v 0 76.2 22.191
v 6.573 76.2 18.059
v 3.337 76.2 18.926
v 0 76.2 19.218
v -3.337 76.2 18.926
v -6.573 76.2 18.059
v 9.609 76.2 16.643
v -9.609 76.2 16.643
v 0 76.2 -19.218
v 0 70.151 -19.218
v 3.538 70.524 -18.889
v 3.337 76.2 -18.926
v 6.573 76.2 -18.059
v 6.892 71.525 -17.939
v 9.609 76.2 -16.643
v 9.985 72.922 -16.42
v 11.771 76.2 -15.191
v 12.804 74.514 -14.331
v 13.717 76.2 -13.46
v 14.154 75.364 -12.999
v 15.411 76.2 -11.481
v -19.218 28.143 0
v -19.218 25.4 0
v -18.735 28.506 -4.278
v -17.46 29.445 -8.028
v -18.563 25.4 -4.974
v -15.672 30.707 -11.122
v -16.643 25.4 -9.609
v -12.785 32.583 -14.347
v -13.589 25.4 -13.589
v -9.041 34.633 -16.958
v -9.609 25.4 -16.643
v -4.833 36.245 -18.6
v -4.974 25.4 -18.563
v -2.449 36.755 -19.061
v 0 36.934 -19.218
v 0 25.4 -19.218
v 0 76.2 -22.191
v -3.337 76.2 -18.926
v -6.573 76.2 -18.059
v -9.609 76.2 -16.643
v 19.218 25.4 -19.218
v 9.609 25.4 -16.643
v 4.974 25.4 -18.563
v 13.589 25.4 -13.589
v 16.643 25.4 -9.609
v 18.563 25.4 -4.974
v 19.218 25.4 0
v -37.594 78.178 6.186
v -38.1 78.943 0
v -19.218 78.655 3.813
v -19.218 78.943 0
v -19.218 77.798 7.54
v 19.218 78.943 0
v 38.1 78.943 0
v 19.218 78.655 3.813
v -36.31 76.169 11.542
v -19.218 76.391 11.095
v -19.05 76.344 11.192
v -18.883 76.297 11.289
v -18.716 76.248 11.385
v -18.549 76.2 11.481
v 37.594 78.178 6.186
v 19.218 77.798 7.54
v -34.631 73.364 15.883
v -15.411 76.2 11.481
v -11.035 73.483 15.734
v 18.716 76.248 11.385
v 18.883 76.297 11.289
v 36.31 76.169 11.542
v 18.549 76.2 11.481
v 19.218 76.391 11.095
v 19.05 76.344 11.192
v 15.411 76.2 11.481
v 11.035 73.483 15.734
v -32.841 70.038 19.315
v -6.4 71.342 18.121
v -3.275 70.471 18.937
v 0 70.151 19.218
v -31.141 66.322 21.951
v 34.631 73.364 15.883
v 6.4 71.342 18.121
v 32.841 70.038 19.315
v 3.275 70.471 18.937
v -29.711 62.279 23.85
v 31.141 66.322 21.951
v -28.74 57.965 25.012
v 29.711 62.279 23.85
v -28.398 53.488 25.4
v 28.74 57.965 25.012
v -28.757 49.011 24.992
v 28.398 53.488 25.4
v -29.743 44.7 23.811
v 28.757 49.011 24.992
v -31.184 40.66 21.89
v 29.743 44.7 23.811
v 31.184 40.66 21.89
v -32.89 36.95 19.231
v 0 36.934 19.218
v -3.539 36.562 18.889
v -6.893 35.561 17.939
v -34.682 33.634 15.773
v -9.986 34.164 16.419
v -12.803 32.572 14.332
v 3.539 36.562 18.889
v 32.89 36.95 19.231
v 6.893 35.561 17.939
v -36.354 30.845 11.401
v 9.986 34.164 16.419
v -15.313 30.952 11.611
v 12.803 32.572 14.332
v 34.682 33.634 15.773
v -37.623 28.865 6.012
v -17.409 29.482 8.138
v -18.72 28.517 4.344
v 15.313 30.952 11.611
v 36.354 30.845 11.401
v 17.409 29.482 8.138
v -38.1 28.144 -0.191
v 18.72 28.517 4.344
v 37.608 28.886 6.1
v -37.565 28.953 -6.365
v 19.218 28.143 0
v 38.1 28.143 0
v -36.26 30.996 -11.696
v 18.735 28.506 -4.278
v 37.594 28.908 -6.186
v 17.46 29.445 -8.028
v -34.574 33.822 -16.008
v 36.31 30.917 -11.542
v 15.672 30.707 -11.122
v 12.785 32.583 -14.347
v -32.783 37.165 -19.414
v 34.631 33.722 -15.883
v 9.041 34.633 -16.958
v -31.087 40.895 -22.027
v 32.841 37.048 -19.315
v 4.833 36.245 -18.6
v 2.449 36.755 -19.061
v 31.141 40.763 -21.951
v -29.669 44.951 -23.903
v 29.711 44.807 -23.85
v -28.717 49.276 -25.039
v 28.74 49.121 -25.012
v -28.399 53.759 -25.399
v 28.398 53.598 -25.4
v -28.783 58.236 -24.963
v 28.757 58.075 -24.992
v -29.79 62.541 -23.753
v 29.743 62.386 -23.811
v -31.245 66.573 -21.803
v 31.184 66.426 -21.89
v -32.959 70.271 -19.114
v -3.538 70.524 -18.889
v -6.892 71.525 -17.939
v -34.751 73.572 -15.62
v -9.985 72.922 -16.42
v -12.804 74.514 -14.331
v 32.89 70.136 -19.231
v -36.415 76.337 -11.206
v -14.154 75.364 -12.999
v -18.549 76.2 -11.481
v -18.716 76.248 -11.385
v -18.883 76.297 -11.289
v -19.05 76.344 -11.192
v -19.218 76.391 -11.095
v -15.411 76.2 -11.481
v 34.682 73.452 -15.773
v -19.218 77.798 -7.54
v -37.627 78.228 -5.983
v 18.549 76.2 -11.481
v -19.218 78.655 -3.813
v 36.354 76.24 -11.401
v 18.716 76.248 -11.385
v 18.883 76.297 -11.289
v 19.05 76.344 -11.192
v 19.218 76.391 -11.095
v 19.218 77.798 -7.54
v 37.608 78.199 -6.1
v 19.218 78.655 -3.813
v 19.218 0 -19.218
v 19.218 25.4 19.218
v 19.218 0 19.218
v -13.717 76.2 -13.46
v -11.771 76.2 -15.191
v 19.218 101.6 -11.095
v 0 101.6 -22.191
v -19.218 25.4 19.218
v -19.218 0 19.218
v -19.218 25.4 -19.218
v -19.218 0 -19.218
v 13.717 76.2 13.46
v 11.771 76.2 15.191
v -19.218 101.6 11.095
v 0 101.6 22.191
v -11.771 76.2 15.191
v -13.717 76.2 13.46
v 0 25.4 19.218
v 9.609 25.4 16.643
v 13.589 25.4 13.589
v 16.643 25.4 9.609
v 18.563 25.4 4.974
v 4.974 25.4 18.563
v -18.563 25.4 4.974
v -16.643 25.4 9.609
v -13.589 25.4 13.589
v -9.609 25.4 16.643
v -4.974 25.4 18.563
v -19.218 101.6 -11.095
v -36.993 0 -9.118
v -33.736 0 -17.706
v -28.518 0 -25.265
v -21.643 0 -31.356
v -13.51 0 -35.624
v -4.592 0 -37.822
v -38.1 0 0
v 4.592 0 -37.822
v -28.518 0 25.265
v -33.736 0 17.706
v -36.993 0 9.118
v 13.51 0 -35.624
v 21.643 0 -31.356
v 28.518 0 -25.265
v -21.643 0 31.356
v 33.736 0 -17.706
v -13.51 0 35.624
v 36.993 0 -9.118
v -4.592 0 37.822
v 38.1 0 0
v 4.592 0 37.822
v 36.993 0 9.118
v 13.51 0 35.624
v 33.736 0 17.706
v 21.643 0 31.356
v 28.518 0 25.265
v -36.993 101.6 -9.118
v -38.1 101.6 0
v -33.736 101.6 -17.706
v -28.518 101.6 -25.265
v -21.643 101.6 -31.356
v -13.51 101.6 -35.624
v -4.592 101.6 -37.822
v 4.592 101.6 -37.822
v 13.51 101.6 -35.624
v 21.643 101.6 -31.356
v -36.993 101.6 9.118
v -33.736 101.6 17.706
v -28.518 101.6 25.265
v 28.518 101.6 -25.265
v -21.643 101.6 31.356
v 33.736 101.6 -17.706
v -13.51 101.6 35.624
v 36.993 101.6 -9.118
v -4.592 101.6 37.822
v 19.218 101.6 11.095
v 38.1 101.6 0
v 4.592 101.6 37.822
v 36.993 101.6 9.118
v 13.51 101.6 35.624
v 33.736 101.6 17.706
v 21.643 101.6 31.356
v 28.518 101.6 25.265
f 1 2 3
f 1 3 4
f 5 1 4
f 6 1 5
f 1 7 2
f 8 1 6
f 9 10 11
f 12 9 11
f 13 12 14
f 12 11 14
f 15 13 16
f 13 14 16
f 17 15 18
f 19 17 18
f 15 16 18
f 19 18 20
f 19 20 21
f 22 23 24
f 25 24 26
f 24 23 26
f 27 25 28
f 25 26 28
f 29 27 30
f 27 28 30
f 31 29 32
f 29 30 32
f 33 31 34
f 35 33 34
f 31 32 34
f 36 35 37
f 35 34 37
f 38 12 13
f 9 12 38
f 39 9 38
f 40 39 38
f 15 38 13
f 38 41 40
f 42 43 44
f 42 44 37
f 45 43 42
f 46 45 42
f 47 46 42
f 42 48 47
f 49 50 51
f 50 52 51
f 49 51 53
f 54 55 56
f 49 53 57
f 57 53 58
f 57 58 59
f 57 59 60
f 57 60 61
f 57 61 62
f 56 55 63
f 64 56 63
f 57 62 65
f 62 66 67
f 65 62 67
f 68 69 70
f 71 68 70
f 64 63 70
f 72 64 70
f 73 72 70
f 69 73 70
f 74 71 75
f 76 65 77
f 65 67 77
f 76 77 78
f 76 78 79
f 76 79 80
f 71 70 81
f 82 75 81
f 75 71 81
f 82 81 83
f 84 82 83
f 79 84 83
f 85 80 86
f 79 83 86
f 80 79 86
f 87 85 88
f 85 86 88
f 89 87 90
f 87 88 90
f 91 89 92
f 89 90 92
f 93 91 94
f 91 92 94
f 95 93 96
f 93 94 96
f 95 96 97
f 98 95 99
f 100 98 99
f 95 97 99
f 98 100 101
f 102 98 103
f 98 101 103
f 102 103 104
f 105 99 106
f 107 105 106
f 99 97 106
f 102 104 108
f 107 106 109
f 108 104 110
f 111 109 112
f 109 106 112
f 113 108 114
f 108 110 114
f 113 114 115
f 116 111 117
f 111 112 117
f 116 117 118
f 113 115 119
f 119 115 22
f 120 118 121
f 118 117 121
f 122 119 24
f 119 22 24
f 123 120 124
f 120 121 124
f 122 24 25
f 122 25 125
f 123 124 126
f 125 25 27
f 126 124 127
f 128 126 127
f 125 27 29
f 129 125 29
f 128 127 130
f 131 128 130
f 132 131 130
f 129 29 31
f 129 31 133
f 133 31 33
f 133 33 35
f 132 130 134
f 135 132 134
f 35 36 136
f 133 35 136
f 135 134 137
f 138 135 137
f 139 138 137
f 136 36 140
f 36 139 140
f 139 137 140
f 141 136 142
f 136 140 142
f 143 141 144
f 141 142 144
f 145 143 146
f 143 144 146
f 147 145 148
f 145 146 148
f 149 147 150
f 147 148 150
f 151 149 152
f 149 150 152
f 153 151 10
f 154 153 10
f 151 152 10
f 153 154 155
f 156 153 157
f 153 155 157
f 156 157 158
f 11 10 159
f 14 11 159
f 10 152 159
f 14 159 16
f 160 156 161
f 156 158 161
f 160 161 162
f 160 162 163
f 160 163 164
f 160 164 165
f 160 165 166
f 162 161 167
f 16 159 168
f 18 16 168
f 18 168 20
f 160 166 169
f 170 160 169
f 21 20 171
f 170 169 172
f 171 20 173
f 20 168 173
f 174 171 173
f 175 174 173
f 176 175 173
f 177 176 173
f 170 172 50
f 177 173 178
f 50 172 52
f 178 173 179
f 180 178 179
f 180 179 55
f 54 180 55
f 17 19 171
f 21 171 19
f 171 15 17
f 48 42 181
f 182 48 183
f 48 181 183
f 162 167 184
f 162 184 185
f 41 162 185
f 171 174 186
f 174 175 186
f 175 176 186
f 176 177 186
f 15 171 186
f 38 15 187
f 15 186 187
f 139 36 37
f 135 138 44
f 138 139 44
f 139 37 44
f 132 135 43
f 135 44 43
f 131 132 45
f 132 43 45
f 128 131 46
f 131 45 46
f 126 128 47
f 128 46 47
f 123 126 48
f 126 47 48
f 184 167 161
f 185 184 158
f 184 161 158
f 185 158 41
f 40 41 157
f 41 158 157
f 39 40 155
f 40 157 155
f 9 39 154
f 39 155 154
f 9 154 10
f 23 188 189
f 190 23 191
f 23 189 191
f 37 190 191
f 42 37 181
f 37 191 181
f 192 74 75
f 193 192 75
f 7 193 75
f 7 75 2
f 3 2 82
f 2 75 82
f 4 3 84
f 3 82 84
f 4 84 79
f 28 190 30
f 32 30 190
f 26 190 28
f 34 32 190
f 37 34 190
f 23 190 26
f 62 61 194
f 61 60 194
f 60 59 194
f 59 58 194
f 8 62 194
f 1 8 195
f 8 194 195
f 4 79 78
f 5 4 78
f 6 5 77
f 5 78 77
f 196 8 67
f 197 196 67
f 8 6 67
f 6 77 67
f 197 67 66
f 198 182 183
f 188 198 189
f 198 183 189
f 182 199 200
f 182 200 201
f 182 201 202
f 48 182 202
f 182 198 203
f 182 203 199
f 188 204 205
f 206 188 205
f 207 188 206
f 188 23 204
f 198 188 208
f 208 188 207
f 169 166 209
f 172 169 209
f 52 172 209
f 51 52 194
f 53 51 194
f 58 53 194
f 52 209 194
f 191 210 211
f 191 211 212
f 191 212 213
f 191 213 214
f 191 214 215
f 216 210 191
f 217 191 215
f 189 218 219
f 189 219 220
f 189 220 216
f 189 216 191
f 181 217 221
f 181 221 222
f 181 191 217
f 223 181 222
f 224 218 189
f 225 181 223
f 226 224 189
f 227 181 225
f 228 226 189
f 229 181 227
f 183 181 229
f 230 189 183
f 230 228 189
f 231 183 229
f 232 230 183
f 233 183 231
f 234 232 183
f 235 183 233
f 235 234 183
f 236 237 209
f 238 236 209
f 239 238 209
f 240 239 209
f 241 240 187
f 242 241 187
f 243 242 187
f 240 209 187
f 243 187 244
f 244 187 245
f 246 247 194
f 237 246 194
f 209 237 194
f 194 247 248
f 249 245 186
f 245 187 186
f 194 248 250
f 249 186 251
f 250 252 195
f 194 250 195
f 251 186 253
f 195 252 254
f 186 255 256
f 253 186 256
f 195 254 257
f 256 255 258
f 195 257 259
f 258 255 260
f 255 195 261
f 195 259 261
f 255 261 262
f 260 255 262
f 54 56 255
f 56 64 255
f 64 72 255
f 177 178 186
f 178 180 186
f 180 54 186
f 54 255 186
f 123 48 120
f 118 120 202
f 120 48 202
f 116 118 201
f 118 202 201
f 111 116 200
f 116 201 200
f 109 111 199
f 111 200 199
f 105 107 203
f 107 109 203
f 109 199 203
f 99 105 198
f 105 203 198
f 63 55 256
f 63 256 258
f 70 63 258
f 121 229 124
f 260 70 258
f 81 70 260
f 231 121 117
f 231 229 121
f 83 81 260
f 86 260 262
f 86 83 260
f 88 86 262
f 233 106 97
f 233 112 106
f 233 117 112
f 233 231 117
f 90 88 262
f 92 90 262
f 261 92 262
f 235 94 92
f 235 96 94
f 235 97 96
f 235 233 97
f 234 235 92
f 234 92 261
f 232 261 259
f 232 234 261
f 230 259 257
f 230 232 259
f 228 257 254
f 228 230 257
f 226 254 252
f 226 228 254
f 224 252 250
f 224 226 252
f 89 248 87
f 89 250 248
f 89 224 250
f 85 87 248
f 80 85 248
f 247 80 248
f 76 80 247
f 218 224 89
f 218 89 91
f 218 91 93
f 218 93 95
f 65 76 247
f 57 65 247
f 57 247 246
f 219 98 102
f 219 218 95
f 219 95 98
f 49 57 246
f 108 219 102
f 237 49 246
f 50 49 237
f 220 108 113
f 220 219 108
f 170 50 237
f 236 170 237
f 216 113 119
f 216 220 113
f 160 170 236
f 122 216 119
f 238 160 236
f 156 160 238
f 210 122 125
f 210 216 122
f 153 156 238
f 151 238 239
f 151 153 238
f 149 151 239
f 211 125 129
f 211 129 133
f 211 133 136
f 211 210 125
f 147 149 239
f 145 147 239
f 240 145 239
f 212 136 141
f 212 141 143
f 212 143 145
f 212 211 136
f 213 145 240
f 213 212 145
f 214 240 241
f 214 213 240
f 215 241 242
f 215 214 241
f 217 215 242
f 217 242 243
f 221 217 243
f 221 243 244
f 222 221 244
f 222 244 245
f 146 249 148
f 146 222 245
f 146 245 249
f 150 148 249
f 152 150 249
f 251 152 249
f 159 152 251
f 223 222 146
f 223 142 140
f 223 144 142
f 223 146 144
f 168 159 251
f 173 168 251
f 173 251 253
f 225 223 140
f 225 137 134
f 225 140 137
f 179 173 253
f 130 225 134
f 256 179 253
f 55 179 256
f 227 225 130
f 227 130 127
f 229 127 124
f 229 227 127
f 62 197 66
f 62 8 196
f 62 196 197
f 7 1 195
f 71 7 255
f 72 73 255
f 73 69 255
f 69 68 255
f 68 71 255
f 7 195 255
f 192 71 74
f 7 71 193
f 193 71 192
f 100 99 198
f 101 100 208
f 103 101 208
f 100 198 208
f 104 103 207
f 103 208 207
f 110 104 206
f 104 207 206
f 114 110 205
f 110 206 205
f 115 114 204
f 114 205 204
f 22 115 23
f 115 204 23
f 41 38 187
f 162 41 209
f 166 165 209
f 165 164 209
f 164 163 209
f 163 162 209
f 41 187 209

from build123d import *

# Parameters (mm, degrees)
F0_R     = 38.1
F1_DEPTH = 101.6
F2_DEPTH = 101.601
F3_DEPTH = 25.4
F5_DEPTH = 25.4
F6_R     = 25.4
F7_DEPTH = 38.1


with BuildPart() as f1:
    # F0 (on Front) → F1 (new body)
    with BuildSketch(Plane.XZ):
        Circle(F0_R)
        Polygon((3.91e-08, -19.2176233977), (-19.2176233977, -19.2176233977), (-19.2176233977, 0), (-19.2176233977, 19.2176233977), (2.72e-08, 19.2176233977), (19.2176233977, 19.2176233977), (19.2176233977, 0), (19.2176233977, -19.2176233977), align=None, mode=Mode.SUBTRACT)
        with BuildLine():
            ThreePointArc((2.72e-08, 19.2176233977), (13.5889118324, 13.5889118132), (19.2176233977, 0))
            Line((19.2176233977, 0), (19.2176233977, 19.2176233977))
            Line((19.2176233977, 19.2176233977), (2.72e-08, 19.2176233977))
        make_face()
        with BuildLine():
            ThreePointArc((-19.2176233977, 0), (-13.588911809, -13.5889118366), (3.91e-08, -19.2176233977))
            ThreePointArc((3.91e-08, -19.2176233977), (13.5889118366, -13.588911809), (19.2176233977, 0))
            ThreePointArc((19.2176233977, 0), (13.5889118324, 13.5889118132), (2.72e-08, 19.2176233977))
            ThreePointArc((2.72e-08, 19.2176233977), (-13.5889118132, 13.5889118324), (-19.2176233977, 0))
        make_face()
        with BuildLine():
            Line((-19.2176233977, 19.2176233977), (-19.2176233977, 0))
            ThreePointArc((-19.2176233977, 0), (-13.5889118132, 13.5889118324), (2.72e-08, 19.2176233977))
            Line((2.72e-08, 19.2176233977), (-19.2176233977, 19.2176233977))
        make_face()
        with BuildLine():
            Line((-19.2176233977, 0), (-19.2176233977, -19.2176233977))
            Line((-19.2176233977, -19.2176233977), (3.91e-08, -19.2176233977))
            ThreePointArc((3.91e-08, -19.2176233977), (-13.588911809, -13.5889118366), (-19.2176233977, 0))
        make_face()
        with BuildLine():
            ThreePointArc((19.2176233977, 0), (13.5889118366, -13.588911809), (3.91e-08, -19.2176233977))
            Line((3.91e-08, -19.2176233977), (19.2176233977, -19.2176233977))
            Line((19.2176233977, -19.2176233977), (19.2176233977, 0))
        make_face()
    extrude(amount=-F1_DEPTH)

    # F0 (on Front) → F2 (cut, through all)
    with BuildSketch(Plane.XZ):
        with BuildLine():
            ThreePointArc((-19.2176233977, 0), (-13.588911809, -13.5889118366), (3.91e-08, -19.2176233977))
            ThreePointArc((3.91e-08, -19.2176233977), (13.5889118366, -13.588911809), (19.2176233977, 0))
            ThreePointArc((19.2176233977, 0), (13.5889118324, 13.5889118132), (2.72e-08, 19.2176233977))
            ThreePointArc((2.72e-08, 19.2176233977), (-13.5889118132, 13.5889118324), (-19.2176233977, 0))
        make_face()
    extrude(amount=-F2_DEPTH, mode=Mode.SUBTRACT)

    # F0 (on Front) → F3 (cut)
    with BuildSketch(Plane.XZ):
        with BuildLine():
            ThreePointArc((19.2176233977, 0), (13.5889118366, -13.588911809), (3.91e-08, -19.2176233977))
            Line((3.91e-08, -19.2176233977), (19.2176233977, -19.2176233977))
            Line((19.2176233977, -19.2176233977), (19.2176233977, 0))
        make_face()
        with BuildLine():
            Line((-19.2176233977, 0), (-19.2176233977, -19.2176233977))
            Line((-19.2176233977, -19.2176233977), (3.91e-08, -19.2176233977))
            ThreePointArc((3.91e-08, -19.2176233977), (-13.588911809, -13.5889118366), (-19.2176233977, 0))
        make_face()
        with BuildLine():
            Line((-19.2176233977, 19.2176233977), (-19.2176233977, 0))
            ThreePointArc((-19.2176233977, 0), (-13.5889118132, 13.5889118324), (2.72e-08, 19.2176233977))
            Line((2.72e-08, 19.2176233977), (-19.2176233977, 19.2176233977))
        make_face()
        with BuildLine():
            ThreePointArc((2.72e-08, 19.2176233977), (13.5889118324, 13.5889118132), (19.2176233977, 0))
            Line((19.2176233977, 0), (19.2176233977, 19.2176233977))
            Line((19.2176233977, 19.2176233977), (2.72e-08, 19.2176233977))
        make_face()
    extrude(amount=-F3_DEPTH, mode=Mode.SUBTRACT)

    # F4 (on face) → F5 (cut)
    with BuildSketch(Plane(origin=(0, 101.6, 0), x_dir=(-1, 0, 0), z_dir=(0, 1, 0))):
        Polygon((-19.2176233977, 11.0953000419), (-19.2176233977, -11.0953000419), (0, -22.1906000837), (19.2176233977, -11.0953000419), (19.2176233977, 11.0953000419), (0, 22.1906000837), align=None)
    extrude(amount=-F5_DEPTH, mode=Mode.SUBTRACT)

    # F6 (on Right) → F7 (cut, symmetric)
    with BuildSketch(Plane.YZ):
        with Locations((53.5429239203, 0)):
            Circle(F6_R)
    extrude(amount=F7_DEPTH, both=True, mode=Mode.SUBTRACT)


solid = f1.part
